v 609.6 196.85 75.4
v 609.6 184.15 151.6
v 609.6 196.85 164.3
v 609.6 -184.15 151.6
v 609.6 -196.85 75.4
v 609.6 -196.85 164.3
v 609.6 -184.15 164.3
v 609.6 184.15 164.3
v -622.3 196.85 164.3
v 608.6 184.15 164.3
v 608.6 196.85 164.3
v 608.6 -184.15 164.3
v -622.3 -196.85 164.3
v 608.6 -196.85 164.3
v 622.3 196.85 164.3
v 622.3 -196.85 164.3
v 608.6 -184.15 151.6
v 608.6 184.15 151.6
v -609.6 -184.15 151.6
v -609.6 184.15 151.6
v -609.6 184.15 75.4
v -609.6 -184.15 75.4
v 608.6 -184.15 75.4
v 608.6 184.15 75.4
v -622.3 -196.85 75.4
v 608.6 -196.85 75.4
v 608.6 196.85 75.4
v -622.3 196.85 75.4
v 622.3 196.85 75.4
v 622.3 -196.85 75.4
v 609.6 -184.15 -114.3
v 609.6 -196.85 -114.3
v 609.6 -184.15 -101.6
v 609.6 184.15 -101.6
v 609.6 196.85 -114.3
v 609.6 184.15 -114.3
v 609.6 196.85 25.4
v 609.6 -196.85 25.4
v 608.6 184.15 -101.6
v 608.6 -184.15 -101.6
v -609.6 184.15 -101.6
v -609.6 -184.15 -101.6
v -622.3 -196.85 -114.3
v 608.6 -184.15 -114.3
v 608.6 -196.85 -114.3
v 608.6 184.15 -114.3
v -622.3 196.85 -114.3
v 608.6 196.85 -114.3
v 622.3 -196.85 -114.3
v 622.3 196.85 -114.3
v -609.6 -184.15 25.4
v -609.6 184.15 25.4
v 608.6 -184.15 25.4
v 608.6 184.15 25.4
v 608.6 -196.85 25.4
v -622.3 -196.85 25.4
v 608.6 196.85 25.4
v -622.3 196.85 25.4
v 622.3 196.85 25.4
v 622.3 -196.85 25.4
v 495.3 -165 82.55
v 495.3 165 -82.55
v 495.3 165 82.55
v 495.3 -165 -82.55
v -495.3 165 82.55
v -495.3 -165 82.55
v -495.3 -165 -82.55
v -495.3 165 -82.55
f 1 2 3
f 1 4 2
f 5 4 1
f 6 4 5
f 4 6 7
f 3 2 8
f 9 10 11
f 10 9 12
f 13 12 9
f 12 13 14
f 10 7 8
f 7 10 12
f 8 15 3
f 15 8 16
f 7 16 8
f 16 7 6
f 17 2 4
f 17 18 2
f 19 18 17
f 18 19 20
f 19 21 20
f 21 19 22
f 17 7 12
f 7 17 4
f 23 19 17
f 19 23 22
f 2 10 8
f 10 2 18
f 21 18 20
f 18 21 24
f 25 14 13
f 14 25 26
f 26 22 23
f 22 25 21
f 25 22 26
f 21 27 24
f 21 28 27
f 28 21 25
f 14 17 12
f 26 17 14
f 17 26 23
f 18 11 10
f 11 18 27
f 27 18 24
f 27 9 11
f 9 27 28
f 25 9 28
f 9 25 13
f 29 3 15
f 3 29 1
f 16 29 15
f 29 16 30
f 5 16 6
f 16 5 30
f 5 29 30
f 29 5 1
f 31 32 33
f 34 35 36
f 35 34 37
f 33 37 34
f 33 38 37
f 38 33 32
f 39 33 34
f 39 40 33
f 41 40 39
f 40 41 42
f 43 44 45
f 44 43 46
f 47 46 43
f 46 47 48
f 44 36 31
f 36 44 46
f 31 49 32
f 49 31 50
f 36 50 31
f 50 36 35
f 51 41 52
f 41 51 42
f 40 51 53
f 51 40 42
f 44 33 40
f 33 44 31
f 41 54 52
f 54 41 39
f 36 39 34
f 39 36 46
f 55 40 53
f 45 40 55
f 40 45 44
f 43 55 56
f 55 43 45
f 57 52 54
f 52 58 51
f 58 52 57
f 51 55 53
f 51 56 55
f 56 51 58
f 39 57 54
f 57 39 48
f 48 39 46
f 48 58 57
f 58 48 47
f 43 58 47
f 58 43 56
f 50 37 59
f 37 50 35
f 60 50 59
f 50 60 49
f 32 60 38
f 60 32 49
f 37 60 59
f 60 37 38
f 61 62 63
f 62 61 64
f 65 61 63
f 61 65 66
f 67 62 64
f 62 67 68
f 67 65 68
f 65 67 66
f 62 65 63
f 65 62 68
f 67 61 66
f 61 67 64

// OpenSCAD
inch_to_mm = 25.4;

module make_lute_guitar(){
    total_scale = 1.2;
    scale([total_scale,total_scale,total_scale]){
        intersection(){
        if(1)
        linear_extrude(height=130)
        import("top.svg");
        
        side_scale = 1.35;
        side_length = 230;
        color("blue")
        translate([-side_length/2-31,-5,65+0])
        scale([side_scale,side_scale,side_scale])
        rotate([0,0,90])
        rotate([90,0,0])
        linear_extrude(height=side_length)
        import("side.svg");
        }
        
        rear_scale = 1.48;
        rear_length = 200;
        color("orange")
        scale([rear_scale,rear_scale,rear_scale])
        translate([0,rear_length/2,47])
        rotate([90,0,0])
        linear_extrude(height=rear_length)
        import("rear.svg");
    }
}

module make_lute_guitar_bb(){
    color("gray")
    translate([0,0,0])
    cube([990.6,330,165.1], center=true);
}

module make_plank_big(length_feet=4){
    translate([0,0,0])
    cube([length_feet*12*inch_to_mm,5.5*inch_to_mm,.5*inch_to_mm], center=true);
}
module make_plank_small(length_feet=4){
    translate([0,0,0])
    cube([length_feet*12*inch_to_mm,3.5*inch_to_mm,.5*inch_to_mm], center=true);
}

module make_plank_big_end(){
    color("orange")
    make_plank_big(length_feet=(5.5+5.5+3.5+.5+.5)/12);
}

module make_plank_small_end(){
    color("yellow")
    make_plank_small(length_feet=(5.5+5.5+3.5+.5+.5)/12);
}

module make_top_panel(){
    color("green")
    for(i=[-1:2:1]){
    translate([0,(5.5*inch_to_mm/2+3.5*inch_to_mm/2)*i,0])
    make_plank_big();
    }
    color("purple")
    translate([0,0,0])
    make_plank_small();
}

make_lute_guitar_bb();

// lid
translate([0,0,50])
translate([0,0,0.5*inch_to_mm/2+8*inch_to_mm/2]){
    make_top_panel();
    
    color("blue")
    for(i=[-1:2:1])
    translate([-1,(5.5+3.5/2+.5/2)*inch_to_mm*i,-3.5*inch_to_mm/2+0.5*inch_to_mm/2])
    rotate([90,0,0])
    make_plank_small();
    
    if(1)
    for(i=[-1:2:1])
    translate([(4*12+.5)*inch_to_mm/2*i,0,-(3.5-.5)*inch_to_mm/2])
    rotate([90,0,90])
    make_plank_small_end();
}

// bottom
translate([0,0,-(0.5*inch_to_mm/2+8*inch_to_mm/2)]){
    make_top_panel();
    
    for(i=[-1:2:1])
    translate([-1,(5.5+3.5/2+.5/2)*inch_to_mm*i,5.5*inch_to_mm/2-0.5*inch_to_mm/2])
    rotate([90,0,0])
    make_plank_big();
    
    for(i=[-1:2:1])
    translate([(4*12+.5)*inch_to_mm/2*i,0,(5.5-.5)*inch_to_mm/2])
    rotate([90,0,90])
    make_plank_big_end();
}

if(0){
make_lute_guitar();

//bowl height
color("gray")
translate([500/2+165/2,0,165/2])
cube([165,165,165], center=true);

//bowl length
color("gray")
translate([0,0,-500/2])
cube([50,500,500], center=true);

//bowl width
color("gray")
translate([0,0,-330/2])
cube([330,50,330], center=true);
}
